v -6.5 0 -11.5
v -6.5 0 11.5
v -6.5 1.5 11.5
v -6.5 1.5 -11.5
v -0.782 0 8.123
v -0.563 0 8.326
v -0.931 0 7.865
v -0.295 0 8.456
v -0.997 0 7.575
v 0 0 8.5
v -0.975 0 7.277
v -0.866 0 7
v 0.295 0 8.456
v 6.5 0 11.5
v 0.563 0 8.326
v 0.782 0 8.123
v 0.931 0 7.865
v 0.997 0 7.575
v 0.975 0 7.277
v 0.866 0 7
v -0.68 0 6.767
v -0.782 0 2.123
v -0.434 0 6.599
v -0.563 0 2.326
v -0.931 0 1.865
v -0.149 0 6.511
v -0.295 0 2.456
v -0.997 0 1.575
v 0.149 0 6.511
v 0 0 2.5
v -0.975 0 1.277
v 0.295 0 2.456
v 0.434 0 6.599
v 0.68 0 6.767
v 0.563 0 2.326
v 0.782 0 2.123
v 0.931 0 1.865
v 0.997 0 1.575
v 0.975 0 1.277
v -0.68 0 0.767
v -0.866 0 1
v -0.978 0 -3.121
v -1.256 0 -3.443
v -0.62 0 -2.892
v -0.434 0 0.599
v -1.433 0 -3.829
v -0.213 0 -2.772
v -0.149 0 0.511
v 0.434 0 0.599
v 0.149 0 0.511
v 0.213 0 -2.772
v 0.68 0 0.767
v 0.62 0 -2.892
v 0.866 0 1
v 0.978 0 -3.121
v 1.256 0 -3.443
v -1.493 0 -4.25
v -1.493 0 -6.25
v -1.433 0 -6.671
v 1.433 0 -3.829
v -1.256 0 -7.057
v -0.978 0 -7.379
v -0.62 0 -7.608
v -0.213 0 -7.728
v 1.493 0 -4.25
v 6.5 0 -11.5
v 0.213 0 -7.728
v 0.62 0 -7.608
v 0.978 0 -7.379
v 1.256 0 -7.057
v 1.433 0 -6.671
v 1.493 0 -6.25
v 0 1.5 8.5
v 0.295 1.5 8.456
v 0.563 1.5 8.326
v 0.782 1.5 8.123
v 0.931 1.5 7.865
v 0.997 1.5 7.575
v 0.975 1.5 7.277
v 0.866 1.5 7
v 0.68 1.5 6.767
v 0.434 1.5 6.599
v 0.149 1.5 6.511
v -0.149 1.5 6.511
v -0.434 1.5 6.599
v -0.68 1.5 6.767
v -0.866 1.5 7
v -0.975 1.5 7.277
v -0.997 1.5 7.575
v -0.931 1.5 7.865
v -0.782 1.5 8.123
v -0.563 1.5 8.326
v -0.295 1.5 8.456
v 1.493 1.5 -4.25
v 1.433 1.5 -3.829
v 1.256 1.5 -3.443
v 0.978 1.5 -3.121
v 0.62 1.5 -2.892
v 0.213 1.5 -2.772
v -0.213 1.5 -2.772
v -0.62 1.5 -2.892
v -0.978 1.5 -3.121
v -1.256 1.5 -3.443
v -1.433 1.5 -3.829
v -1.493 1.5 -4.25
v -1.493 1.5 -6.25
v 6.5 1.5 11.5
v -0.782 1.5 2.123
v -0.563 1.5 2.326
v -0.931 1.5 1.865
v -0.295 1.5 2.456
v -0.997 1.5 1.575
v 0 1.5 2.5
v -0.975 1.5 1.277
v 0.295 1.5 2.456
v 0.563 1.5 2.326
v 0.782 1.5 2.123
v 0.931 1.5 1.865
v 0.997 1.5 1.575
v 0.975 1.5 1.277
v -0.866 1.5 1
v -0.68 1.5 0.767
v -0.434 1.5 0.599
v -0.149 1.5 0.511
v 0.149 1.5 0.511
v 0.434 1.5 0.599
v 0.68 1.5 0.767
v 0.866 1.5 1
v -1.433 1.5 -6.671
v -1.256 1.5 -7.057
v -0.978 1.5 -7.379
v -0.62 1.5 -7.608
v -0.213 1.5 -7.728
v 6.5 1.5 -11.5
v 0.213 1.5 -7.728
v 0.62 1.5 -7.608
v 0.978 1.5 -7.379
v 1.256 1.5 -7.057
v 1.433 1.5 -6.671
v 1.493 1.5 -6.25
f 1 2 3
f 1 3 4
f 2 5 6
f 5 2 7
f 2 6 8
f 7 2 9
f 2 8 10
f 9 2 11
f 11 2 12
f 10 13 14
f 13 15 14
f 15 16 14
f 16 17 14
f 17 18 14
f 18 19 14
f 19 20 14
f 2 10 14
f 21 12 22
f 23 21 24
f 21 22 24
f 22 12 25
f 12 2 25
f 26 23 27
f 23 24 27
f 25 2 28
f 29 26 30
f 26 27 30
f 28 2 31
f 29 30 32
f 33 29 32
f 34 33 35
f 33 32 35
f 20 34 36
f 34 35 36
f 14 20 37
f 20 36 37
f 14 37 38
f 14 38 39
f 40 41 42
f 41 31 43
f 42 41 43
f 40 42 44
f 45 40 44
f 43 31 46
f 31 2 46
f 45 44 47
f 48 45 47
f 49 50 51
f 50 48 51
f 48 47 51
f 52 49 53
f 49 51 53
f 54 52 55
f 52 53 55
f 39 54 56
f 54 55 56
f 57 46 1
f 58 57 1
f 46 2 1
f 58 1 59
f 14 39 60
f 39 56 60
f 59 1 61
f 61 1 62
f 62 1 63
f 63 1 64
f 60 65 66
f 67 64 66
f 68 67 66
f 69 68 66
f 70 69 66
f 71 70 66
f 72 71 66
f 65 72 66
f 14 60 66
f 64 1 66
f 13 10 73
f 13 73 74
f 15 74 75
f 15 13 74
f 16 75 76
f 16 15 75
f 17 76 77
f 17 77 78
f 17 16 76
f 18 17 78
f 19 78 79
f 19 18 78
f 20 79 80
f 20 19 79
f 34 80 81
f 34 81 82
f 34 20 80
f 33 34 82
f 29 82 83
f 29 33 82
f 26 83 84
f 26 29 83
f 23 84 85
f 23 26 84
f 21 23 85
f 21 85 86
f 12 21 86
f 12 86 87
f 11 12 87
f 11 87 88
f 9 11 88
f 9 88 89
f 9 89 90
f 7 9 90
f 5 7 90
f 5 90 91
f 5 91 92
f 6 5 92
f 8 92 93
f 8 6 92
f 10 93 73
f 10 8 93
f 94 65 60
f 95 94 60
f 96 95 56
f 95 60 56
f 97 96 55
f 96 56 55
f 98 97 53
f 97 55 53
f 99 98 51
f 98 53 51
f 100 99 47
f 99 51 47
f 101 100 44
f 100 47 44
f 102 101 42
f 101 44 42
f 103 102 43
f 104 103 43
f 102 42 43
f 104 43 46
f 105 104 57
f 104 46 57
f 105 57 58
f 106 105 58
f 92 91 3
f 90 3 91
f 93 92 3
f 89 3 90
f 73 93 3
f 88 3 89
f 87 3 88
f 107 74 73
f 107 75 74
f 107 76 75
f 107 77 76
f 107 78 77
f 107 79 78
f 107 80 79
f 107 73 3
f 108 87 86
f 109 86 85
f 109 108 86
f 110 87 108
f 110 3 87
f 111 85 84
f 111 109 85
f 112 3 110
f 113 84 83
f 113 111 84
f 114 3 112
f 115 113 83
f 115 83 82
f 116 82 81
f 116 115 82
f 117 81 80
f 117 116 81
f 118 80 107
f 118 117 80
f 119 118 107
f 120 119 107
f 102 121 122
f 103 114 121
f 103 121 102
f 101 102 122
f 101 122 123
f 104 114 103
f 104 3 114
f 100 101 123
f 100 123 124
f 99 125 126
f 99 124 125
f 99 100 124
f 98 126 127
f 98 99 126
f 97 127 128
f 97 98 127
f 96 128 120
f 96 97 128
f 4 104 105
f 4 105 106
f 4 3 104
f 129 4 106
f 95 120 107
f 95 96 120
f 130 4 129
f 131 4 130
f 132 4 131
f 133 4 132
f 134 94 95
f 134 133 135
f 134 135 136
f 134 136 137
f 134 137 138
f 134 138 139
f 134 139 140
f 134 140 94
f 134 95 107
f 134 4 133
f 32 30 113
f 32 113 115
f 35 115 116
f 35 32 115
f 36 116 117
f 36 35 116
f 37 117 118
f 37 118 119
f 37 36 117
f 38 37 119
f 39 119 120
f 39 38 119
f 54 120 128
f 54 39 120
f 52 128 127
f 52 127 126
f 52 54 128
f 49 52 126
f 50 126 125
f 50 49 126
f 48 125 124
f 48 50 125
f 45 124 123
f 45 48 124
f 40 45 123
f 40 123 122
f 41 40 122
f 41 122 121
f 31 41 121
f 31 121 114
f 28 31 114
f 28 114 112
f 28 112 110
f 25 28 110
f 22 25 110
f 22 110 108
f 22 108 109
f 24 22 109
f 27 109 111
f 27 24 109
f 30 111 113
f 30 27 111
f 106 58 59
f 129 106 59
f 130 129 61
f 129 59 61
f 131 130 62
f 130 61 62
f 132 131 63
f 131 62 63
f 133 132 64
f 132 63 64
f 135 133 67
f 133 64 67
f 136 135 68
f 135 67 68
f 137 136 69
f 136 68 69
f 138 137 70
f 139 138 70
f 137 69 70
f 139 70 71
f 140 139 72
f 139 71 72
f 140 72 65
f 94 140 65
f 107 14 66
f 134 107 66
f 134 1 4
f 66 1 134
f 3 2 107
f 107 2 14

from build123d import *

# Parameters (mm, degrees)
SKETCH1_W           = 13
SKETCH1_H           = 23
SKETCH1_R           = 1
BOSS_EXTRUDE1_DEPTH = 1.5


with BuildPart() as part:
    # Sketch1 → Boss-Extrude1 (new body)
    with BuildSketch(Plane(origin=(0, 0, 0), x_dir=(1, 0, 0), z_dir=(0, 1, 0))):
        Rectangle(SKETCH1_W, SKETCH1_H)
        with Locations(Location((0, -1.5, 0), (0, 0, 270))):
            Circle(SKETCH1_R, mode=Mode.SUBTRACT)
        with Locations(Location((0, -7.5, 0), (0, 0, 270))):
            Circle(SKETCH1_R, mode=Mode.SUBTRACT)
        with BuildLine():
            Line((-1.493243243, 4.25), (-1.493243243, 6.25))
            ThreePointArc((-1.493243243, 6.25), (0, 7.743243243), (1.493243243, 6.25))
            Line((1.493243243, 6.25), (1.493243243, 4.25))
            ThreePointArc((1.493243243, 4.25), (0, 2.756756757), (-1.493243243, 4.25))
        make_face(mode=Mode.SUBTRACT)
    extrude(amount=BOSS_EXTRUDE1_DEPTH)


solid = part.part
